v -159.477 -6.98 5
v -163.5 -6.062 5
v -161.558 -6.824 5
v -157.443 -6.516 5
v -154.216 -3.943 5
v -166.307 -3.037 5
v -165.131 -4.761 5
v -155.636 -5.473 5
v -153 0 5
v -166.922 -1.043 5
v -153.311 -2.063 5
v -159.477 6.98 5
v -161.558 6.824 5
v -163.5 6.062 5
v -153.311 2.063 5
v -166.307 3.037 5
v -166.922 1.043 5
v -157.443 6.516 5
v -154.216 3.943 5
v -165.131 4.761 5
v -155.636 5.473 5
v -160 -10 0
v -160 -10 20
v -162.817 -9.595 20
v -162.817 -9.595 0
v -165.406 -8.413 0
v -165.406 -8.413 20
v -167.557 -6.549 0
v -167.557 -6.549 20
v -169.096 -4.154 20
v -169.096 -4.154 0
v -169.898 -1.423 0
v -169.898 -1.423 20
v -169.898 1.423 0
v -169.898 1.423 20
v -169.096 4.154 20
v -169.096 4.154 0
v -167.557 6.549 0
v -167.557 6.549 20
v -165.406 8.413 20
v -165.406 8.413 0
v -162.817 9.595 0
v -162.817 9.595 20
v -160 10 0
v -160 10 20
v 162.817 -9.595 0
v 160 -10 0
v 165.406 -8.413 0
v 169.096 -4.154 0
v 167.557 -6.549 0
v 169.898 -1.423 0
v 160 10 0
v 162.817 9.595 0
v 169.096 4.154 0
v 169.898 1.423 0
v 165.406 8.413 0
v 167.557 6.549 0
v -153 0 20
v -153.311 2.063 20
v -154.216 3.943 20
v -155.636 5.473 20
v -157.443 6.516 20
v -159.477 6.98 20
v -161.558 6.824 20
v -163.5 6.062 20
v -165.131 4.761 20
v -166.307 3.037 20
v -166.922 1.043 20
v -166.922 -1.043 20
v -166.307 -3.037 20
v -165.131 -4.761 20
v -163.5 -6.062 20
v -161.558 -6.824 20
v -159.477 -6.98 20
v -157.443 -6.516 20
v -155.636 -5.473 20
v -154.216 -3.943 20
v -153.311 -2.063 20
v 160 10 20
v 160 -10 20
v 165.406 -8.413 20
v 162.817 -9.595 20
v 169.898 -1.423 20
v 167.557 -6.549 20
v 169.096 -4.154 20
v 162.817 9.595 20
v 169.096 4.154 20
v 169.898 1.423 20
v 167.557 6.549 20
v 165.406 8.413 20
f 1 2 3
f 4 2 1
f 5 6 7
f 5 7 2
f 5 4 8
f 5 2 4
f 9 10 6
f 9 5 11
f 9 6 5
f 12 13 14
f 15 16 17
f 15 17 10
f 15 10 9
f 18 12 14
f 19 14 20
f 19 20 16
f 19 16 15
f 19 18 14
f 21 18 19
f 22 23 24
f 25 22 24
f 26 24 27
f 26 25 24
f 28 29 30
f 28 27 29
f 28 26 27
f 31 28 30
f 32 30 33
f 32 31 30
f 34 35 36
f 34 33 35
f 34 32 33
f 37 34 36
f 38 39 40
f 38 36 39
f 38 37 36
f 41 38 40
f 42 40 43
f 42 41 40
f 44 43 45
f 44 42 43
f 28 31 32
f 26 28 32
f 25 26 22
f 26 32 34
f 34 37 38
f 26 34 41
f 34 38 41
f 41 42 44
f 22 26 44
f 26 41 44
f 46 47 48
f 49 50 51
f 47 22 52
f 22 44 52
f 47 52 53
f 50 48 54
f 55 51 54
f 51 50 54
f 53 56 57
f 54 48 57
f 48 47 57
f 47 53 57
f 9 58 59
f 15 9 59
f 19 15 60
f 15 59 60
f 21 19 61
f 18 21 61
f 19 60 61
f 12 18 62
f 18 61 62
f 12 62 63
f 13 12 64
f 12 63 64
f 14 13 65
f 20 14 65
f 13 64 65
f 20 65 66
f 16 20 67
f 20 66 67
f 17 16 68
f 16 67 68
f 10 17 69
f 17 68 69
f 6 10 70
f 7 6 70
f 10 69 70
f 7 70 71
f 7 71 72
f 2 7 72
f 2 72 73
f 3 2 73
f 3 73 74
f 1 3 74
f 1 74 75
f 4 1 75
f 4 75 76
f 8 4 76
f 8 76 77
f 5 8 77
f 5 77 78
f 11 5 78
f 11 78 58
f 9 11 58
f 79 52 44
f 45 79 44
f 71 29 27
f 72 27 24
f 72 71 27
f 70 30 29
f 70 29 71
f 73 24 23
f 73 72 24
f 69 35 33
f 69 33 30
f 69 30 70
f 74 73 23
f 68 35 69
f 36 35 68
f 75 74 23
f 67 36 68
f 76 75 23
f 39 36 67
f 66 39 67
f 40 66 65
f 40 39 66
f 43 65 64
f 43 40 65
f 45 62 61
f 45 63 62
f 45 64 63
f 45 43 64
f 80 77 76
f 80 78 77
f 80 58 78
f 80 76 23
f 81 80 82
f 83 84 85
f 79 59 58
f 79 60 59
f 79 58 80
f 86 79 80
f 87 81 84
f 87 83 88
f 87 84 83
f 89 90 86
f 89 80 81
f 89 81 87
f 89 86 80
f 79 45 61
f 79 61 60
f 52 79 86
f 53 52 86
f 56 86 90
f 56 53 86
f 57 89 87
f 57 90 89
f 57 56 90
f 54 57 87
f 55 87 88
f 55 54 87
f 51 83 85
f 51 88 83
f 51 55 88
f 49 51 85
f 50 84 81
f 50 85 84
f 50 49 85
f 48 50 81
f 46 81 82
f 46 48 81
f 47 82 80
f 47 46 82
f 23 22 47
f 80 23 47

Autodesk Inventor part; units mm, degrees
ref_plane "YZ Plane" through (0, 0, 0) normal (1, 0, 0) x (0, 1, 0)
ref_plane "XZ Plane" through (0, 0, 0) normal (0, 1, 0) x (-1, 0, 0)
ref_plane "XY Plane" through (0, 0, 0) normal (0, 0, 1) x (1, 0, 0)
sketch "Sketch1" plane through (0, 0, 0) normal (0, 0, 1) x (1, 0, 0)
  line L0 (-160, -10) -> (160, -10)
  line L1 (160, -10) -> (160, 10) construction
  line L2 (160, 10) -> (-160, 10)
  line L3 (-160, 10) -> (-160, -10) construction
  line L4 (-160, -10) -> (160, 10) construction
  line L5 (160, -10) -> (-160, 10) construction
  arc A0 (-160, 10) -> (-160, -10) centre (-160, 0) ccw
  arc A1 (160, -10) -> (160, 10) centre (160, 0) ccw
  point P0 (0, 0)
  dimension "d0" = 320
  dimension "d1" = 20
extrude "Extrusion1" add sketch "Sketch1" along normal blind 20
sketch "Sketch3" plane through (0, 0, 20) normal (0, 0, 1) x (1, 0, 0)
  arc A0 (-160, 10) -> (-160, -10) centre (-160, 0) ccw projected
  circle A1 centre (-160, 0) radius 7
  point P0 (0, 0)
  dimension "d7" = 14
extrude "Extrusion3" cut sketch "Sketch3" against normal blind 15
properties part number "u_kleine_Hoehenverstellung"
